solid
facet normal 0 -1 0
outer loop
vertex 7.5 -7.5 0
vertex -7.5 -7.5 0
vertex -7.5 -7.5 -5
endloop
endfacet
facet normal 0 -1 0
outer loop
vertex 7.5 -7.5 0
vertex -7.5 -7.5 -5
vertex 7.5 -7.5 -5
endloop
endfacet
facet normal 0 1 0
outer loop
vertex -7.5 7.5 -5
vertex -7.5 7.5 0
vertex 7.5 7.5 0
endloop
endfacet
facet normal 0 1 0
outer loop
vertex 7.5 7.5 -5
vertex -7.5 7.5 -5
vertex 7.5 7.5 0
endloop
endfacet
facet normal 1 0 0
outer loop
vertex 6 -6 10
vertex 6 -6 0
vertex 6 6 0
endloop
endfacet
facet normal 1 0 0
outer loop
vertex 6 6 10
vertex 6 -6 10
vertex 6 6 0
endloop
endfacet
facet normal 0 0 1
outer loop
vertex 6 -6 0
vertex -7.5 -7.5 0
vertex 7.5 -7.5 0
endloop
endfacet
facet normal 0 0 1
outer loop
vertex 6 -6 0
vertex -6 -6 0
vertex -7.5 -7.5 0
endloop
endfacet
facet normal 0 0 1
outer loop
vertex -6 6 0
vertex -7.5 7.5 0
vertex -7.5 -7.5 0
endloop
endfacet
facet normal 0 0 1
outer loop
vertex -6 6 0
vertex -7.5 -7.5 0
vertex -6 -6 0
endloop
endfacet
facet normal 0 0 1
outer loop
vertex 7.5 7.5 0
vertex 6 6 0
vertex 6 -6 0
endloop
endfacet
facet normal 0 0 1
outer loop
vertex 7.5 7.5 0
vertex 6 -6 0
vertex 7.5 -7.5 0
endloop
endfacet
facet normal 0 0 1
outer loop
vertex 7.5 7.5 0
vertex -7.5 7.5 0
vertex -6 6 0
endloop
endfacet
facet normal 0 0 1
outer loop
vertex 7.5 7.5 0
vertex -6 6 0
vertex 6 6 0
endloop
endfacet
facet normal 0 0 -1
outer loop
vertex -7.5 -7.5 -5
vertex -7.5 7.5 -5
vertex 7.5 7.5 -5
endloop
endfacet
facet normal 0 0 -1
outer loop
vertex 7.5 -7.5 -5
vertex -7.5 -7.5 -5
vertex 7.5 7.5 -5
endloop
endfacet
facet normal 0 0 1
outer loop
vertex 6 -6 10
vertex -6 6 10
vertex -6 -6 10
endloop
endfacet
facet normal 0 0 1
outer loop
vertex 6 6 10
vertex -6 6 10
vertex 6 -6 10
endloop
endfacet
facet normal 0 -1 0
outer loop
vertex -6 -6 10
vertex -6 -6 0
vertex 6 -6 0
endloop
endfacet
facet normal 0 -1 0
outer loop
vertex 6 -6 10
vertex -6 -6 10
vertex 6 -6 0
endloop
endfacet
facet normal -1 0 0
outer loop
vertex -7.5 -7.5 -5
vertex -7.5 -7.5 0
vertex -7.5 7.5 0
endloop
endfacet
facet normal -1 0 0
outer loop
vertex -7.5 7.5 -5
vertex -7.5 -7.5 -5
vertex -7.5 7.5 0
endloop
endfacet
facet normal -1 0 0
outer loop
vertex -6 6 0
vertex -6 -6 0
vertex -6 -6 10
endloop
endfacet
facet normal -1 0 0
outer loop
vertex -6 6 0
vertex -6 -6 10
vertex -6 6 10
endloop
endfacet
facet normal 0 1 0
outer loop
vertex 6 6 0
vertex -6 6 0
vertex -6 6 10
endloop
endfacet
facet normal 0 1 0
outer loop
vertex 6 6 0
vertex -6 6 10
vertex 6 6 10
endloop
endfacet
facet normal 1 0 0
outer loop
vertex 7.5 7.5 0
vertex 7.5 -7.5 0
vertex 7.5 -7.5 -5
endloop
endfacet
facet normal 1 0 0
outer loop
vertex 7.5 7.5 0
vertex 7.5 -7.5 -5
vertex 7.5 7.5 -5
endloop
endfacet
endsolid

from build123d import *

# Parameters (mm, degrees)
F0_W     = 15
F0_H     = 15
F0_W_2   = 12
F0_H_2   = 12
F1_DEPTH = 5
F2_DEPTH = 10


with BuildPart() as f1:
    # F0 (on Top) → F1 (new body)
    with BuildSketch(Plane.XY):
        Rectangle(F0_W, F0_H)
        Rectangle(F0_W_2, F0_H_2, mode=Mode.SUBTRACT)
        Rectangle(F0_W_2, F0_H_2)
    extrude(amount=-F1_DEPTH)

    # F0 (on Top) → F2 (join)
    with BuildSketch(Plane.XY):
        Rectangle(F0_W_2, F0_H_2)
    extrude(amount=F2_DEPTH)


solid = f1.part
